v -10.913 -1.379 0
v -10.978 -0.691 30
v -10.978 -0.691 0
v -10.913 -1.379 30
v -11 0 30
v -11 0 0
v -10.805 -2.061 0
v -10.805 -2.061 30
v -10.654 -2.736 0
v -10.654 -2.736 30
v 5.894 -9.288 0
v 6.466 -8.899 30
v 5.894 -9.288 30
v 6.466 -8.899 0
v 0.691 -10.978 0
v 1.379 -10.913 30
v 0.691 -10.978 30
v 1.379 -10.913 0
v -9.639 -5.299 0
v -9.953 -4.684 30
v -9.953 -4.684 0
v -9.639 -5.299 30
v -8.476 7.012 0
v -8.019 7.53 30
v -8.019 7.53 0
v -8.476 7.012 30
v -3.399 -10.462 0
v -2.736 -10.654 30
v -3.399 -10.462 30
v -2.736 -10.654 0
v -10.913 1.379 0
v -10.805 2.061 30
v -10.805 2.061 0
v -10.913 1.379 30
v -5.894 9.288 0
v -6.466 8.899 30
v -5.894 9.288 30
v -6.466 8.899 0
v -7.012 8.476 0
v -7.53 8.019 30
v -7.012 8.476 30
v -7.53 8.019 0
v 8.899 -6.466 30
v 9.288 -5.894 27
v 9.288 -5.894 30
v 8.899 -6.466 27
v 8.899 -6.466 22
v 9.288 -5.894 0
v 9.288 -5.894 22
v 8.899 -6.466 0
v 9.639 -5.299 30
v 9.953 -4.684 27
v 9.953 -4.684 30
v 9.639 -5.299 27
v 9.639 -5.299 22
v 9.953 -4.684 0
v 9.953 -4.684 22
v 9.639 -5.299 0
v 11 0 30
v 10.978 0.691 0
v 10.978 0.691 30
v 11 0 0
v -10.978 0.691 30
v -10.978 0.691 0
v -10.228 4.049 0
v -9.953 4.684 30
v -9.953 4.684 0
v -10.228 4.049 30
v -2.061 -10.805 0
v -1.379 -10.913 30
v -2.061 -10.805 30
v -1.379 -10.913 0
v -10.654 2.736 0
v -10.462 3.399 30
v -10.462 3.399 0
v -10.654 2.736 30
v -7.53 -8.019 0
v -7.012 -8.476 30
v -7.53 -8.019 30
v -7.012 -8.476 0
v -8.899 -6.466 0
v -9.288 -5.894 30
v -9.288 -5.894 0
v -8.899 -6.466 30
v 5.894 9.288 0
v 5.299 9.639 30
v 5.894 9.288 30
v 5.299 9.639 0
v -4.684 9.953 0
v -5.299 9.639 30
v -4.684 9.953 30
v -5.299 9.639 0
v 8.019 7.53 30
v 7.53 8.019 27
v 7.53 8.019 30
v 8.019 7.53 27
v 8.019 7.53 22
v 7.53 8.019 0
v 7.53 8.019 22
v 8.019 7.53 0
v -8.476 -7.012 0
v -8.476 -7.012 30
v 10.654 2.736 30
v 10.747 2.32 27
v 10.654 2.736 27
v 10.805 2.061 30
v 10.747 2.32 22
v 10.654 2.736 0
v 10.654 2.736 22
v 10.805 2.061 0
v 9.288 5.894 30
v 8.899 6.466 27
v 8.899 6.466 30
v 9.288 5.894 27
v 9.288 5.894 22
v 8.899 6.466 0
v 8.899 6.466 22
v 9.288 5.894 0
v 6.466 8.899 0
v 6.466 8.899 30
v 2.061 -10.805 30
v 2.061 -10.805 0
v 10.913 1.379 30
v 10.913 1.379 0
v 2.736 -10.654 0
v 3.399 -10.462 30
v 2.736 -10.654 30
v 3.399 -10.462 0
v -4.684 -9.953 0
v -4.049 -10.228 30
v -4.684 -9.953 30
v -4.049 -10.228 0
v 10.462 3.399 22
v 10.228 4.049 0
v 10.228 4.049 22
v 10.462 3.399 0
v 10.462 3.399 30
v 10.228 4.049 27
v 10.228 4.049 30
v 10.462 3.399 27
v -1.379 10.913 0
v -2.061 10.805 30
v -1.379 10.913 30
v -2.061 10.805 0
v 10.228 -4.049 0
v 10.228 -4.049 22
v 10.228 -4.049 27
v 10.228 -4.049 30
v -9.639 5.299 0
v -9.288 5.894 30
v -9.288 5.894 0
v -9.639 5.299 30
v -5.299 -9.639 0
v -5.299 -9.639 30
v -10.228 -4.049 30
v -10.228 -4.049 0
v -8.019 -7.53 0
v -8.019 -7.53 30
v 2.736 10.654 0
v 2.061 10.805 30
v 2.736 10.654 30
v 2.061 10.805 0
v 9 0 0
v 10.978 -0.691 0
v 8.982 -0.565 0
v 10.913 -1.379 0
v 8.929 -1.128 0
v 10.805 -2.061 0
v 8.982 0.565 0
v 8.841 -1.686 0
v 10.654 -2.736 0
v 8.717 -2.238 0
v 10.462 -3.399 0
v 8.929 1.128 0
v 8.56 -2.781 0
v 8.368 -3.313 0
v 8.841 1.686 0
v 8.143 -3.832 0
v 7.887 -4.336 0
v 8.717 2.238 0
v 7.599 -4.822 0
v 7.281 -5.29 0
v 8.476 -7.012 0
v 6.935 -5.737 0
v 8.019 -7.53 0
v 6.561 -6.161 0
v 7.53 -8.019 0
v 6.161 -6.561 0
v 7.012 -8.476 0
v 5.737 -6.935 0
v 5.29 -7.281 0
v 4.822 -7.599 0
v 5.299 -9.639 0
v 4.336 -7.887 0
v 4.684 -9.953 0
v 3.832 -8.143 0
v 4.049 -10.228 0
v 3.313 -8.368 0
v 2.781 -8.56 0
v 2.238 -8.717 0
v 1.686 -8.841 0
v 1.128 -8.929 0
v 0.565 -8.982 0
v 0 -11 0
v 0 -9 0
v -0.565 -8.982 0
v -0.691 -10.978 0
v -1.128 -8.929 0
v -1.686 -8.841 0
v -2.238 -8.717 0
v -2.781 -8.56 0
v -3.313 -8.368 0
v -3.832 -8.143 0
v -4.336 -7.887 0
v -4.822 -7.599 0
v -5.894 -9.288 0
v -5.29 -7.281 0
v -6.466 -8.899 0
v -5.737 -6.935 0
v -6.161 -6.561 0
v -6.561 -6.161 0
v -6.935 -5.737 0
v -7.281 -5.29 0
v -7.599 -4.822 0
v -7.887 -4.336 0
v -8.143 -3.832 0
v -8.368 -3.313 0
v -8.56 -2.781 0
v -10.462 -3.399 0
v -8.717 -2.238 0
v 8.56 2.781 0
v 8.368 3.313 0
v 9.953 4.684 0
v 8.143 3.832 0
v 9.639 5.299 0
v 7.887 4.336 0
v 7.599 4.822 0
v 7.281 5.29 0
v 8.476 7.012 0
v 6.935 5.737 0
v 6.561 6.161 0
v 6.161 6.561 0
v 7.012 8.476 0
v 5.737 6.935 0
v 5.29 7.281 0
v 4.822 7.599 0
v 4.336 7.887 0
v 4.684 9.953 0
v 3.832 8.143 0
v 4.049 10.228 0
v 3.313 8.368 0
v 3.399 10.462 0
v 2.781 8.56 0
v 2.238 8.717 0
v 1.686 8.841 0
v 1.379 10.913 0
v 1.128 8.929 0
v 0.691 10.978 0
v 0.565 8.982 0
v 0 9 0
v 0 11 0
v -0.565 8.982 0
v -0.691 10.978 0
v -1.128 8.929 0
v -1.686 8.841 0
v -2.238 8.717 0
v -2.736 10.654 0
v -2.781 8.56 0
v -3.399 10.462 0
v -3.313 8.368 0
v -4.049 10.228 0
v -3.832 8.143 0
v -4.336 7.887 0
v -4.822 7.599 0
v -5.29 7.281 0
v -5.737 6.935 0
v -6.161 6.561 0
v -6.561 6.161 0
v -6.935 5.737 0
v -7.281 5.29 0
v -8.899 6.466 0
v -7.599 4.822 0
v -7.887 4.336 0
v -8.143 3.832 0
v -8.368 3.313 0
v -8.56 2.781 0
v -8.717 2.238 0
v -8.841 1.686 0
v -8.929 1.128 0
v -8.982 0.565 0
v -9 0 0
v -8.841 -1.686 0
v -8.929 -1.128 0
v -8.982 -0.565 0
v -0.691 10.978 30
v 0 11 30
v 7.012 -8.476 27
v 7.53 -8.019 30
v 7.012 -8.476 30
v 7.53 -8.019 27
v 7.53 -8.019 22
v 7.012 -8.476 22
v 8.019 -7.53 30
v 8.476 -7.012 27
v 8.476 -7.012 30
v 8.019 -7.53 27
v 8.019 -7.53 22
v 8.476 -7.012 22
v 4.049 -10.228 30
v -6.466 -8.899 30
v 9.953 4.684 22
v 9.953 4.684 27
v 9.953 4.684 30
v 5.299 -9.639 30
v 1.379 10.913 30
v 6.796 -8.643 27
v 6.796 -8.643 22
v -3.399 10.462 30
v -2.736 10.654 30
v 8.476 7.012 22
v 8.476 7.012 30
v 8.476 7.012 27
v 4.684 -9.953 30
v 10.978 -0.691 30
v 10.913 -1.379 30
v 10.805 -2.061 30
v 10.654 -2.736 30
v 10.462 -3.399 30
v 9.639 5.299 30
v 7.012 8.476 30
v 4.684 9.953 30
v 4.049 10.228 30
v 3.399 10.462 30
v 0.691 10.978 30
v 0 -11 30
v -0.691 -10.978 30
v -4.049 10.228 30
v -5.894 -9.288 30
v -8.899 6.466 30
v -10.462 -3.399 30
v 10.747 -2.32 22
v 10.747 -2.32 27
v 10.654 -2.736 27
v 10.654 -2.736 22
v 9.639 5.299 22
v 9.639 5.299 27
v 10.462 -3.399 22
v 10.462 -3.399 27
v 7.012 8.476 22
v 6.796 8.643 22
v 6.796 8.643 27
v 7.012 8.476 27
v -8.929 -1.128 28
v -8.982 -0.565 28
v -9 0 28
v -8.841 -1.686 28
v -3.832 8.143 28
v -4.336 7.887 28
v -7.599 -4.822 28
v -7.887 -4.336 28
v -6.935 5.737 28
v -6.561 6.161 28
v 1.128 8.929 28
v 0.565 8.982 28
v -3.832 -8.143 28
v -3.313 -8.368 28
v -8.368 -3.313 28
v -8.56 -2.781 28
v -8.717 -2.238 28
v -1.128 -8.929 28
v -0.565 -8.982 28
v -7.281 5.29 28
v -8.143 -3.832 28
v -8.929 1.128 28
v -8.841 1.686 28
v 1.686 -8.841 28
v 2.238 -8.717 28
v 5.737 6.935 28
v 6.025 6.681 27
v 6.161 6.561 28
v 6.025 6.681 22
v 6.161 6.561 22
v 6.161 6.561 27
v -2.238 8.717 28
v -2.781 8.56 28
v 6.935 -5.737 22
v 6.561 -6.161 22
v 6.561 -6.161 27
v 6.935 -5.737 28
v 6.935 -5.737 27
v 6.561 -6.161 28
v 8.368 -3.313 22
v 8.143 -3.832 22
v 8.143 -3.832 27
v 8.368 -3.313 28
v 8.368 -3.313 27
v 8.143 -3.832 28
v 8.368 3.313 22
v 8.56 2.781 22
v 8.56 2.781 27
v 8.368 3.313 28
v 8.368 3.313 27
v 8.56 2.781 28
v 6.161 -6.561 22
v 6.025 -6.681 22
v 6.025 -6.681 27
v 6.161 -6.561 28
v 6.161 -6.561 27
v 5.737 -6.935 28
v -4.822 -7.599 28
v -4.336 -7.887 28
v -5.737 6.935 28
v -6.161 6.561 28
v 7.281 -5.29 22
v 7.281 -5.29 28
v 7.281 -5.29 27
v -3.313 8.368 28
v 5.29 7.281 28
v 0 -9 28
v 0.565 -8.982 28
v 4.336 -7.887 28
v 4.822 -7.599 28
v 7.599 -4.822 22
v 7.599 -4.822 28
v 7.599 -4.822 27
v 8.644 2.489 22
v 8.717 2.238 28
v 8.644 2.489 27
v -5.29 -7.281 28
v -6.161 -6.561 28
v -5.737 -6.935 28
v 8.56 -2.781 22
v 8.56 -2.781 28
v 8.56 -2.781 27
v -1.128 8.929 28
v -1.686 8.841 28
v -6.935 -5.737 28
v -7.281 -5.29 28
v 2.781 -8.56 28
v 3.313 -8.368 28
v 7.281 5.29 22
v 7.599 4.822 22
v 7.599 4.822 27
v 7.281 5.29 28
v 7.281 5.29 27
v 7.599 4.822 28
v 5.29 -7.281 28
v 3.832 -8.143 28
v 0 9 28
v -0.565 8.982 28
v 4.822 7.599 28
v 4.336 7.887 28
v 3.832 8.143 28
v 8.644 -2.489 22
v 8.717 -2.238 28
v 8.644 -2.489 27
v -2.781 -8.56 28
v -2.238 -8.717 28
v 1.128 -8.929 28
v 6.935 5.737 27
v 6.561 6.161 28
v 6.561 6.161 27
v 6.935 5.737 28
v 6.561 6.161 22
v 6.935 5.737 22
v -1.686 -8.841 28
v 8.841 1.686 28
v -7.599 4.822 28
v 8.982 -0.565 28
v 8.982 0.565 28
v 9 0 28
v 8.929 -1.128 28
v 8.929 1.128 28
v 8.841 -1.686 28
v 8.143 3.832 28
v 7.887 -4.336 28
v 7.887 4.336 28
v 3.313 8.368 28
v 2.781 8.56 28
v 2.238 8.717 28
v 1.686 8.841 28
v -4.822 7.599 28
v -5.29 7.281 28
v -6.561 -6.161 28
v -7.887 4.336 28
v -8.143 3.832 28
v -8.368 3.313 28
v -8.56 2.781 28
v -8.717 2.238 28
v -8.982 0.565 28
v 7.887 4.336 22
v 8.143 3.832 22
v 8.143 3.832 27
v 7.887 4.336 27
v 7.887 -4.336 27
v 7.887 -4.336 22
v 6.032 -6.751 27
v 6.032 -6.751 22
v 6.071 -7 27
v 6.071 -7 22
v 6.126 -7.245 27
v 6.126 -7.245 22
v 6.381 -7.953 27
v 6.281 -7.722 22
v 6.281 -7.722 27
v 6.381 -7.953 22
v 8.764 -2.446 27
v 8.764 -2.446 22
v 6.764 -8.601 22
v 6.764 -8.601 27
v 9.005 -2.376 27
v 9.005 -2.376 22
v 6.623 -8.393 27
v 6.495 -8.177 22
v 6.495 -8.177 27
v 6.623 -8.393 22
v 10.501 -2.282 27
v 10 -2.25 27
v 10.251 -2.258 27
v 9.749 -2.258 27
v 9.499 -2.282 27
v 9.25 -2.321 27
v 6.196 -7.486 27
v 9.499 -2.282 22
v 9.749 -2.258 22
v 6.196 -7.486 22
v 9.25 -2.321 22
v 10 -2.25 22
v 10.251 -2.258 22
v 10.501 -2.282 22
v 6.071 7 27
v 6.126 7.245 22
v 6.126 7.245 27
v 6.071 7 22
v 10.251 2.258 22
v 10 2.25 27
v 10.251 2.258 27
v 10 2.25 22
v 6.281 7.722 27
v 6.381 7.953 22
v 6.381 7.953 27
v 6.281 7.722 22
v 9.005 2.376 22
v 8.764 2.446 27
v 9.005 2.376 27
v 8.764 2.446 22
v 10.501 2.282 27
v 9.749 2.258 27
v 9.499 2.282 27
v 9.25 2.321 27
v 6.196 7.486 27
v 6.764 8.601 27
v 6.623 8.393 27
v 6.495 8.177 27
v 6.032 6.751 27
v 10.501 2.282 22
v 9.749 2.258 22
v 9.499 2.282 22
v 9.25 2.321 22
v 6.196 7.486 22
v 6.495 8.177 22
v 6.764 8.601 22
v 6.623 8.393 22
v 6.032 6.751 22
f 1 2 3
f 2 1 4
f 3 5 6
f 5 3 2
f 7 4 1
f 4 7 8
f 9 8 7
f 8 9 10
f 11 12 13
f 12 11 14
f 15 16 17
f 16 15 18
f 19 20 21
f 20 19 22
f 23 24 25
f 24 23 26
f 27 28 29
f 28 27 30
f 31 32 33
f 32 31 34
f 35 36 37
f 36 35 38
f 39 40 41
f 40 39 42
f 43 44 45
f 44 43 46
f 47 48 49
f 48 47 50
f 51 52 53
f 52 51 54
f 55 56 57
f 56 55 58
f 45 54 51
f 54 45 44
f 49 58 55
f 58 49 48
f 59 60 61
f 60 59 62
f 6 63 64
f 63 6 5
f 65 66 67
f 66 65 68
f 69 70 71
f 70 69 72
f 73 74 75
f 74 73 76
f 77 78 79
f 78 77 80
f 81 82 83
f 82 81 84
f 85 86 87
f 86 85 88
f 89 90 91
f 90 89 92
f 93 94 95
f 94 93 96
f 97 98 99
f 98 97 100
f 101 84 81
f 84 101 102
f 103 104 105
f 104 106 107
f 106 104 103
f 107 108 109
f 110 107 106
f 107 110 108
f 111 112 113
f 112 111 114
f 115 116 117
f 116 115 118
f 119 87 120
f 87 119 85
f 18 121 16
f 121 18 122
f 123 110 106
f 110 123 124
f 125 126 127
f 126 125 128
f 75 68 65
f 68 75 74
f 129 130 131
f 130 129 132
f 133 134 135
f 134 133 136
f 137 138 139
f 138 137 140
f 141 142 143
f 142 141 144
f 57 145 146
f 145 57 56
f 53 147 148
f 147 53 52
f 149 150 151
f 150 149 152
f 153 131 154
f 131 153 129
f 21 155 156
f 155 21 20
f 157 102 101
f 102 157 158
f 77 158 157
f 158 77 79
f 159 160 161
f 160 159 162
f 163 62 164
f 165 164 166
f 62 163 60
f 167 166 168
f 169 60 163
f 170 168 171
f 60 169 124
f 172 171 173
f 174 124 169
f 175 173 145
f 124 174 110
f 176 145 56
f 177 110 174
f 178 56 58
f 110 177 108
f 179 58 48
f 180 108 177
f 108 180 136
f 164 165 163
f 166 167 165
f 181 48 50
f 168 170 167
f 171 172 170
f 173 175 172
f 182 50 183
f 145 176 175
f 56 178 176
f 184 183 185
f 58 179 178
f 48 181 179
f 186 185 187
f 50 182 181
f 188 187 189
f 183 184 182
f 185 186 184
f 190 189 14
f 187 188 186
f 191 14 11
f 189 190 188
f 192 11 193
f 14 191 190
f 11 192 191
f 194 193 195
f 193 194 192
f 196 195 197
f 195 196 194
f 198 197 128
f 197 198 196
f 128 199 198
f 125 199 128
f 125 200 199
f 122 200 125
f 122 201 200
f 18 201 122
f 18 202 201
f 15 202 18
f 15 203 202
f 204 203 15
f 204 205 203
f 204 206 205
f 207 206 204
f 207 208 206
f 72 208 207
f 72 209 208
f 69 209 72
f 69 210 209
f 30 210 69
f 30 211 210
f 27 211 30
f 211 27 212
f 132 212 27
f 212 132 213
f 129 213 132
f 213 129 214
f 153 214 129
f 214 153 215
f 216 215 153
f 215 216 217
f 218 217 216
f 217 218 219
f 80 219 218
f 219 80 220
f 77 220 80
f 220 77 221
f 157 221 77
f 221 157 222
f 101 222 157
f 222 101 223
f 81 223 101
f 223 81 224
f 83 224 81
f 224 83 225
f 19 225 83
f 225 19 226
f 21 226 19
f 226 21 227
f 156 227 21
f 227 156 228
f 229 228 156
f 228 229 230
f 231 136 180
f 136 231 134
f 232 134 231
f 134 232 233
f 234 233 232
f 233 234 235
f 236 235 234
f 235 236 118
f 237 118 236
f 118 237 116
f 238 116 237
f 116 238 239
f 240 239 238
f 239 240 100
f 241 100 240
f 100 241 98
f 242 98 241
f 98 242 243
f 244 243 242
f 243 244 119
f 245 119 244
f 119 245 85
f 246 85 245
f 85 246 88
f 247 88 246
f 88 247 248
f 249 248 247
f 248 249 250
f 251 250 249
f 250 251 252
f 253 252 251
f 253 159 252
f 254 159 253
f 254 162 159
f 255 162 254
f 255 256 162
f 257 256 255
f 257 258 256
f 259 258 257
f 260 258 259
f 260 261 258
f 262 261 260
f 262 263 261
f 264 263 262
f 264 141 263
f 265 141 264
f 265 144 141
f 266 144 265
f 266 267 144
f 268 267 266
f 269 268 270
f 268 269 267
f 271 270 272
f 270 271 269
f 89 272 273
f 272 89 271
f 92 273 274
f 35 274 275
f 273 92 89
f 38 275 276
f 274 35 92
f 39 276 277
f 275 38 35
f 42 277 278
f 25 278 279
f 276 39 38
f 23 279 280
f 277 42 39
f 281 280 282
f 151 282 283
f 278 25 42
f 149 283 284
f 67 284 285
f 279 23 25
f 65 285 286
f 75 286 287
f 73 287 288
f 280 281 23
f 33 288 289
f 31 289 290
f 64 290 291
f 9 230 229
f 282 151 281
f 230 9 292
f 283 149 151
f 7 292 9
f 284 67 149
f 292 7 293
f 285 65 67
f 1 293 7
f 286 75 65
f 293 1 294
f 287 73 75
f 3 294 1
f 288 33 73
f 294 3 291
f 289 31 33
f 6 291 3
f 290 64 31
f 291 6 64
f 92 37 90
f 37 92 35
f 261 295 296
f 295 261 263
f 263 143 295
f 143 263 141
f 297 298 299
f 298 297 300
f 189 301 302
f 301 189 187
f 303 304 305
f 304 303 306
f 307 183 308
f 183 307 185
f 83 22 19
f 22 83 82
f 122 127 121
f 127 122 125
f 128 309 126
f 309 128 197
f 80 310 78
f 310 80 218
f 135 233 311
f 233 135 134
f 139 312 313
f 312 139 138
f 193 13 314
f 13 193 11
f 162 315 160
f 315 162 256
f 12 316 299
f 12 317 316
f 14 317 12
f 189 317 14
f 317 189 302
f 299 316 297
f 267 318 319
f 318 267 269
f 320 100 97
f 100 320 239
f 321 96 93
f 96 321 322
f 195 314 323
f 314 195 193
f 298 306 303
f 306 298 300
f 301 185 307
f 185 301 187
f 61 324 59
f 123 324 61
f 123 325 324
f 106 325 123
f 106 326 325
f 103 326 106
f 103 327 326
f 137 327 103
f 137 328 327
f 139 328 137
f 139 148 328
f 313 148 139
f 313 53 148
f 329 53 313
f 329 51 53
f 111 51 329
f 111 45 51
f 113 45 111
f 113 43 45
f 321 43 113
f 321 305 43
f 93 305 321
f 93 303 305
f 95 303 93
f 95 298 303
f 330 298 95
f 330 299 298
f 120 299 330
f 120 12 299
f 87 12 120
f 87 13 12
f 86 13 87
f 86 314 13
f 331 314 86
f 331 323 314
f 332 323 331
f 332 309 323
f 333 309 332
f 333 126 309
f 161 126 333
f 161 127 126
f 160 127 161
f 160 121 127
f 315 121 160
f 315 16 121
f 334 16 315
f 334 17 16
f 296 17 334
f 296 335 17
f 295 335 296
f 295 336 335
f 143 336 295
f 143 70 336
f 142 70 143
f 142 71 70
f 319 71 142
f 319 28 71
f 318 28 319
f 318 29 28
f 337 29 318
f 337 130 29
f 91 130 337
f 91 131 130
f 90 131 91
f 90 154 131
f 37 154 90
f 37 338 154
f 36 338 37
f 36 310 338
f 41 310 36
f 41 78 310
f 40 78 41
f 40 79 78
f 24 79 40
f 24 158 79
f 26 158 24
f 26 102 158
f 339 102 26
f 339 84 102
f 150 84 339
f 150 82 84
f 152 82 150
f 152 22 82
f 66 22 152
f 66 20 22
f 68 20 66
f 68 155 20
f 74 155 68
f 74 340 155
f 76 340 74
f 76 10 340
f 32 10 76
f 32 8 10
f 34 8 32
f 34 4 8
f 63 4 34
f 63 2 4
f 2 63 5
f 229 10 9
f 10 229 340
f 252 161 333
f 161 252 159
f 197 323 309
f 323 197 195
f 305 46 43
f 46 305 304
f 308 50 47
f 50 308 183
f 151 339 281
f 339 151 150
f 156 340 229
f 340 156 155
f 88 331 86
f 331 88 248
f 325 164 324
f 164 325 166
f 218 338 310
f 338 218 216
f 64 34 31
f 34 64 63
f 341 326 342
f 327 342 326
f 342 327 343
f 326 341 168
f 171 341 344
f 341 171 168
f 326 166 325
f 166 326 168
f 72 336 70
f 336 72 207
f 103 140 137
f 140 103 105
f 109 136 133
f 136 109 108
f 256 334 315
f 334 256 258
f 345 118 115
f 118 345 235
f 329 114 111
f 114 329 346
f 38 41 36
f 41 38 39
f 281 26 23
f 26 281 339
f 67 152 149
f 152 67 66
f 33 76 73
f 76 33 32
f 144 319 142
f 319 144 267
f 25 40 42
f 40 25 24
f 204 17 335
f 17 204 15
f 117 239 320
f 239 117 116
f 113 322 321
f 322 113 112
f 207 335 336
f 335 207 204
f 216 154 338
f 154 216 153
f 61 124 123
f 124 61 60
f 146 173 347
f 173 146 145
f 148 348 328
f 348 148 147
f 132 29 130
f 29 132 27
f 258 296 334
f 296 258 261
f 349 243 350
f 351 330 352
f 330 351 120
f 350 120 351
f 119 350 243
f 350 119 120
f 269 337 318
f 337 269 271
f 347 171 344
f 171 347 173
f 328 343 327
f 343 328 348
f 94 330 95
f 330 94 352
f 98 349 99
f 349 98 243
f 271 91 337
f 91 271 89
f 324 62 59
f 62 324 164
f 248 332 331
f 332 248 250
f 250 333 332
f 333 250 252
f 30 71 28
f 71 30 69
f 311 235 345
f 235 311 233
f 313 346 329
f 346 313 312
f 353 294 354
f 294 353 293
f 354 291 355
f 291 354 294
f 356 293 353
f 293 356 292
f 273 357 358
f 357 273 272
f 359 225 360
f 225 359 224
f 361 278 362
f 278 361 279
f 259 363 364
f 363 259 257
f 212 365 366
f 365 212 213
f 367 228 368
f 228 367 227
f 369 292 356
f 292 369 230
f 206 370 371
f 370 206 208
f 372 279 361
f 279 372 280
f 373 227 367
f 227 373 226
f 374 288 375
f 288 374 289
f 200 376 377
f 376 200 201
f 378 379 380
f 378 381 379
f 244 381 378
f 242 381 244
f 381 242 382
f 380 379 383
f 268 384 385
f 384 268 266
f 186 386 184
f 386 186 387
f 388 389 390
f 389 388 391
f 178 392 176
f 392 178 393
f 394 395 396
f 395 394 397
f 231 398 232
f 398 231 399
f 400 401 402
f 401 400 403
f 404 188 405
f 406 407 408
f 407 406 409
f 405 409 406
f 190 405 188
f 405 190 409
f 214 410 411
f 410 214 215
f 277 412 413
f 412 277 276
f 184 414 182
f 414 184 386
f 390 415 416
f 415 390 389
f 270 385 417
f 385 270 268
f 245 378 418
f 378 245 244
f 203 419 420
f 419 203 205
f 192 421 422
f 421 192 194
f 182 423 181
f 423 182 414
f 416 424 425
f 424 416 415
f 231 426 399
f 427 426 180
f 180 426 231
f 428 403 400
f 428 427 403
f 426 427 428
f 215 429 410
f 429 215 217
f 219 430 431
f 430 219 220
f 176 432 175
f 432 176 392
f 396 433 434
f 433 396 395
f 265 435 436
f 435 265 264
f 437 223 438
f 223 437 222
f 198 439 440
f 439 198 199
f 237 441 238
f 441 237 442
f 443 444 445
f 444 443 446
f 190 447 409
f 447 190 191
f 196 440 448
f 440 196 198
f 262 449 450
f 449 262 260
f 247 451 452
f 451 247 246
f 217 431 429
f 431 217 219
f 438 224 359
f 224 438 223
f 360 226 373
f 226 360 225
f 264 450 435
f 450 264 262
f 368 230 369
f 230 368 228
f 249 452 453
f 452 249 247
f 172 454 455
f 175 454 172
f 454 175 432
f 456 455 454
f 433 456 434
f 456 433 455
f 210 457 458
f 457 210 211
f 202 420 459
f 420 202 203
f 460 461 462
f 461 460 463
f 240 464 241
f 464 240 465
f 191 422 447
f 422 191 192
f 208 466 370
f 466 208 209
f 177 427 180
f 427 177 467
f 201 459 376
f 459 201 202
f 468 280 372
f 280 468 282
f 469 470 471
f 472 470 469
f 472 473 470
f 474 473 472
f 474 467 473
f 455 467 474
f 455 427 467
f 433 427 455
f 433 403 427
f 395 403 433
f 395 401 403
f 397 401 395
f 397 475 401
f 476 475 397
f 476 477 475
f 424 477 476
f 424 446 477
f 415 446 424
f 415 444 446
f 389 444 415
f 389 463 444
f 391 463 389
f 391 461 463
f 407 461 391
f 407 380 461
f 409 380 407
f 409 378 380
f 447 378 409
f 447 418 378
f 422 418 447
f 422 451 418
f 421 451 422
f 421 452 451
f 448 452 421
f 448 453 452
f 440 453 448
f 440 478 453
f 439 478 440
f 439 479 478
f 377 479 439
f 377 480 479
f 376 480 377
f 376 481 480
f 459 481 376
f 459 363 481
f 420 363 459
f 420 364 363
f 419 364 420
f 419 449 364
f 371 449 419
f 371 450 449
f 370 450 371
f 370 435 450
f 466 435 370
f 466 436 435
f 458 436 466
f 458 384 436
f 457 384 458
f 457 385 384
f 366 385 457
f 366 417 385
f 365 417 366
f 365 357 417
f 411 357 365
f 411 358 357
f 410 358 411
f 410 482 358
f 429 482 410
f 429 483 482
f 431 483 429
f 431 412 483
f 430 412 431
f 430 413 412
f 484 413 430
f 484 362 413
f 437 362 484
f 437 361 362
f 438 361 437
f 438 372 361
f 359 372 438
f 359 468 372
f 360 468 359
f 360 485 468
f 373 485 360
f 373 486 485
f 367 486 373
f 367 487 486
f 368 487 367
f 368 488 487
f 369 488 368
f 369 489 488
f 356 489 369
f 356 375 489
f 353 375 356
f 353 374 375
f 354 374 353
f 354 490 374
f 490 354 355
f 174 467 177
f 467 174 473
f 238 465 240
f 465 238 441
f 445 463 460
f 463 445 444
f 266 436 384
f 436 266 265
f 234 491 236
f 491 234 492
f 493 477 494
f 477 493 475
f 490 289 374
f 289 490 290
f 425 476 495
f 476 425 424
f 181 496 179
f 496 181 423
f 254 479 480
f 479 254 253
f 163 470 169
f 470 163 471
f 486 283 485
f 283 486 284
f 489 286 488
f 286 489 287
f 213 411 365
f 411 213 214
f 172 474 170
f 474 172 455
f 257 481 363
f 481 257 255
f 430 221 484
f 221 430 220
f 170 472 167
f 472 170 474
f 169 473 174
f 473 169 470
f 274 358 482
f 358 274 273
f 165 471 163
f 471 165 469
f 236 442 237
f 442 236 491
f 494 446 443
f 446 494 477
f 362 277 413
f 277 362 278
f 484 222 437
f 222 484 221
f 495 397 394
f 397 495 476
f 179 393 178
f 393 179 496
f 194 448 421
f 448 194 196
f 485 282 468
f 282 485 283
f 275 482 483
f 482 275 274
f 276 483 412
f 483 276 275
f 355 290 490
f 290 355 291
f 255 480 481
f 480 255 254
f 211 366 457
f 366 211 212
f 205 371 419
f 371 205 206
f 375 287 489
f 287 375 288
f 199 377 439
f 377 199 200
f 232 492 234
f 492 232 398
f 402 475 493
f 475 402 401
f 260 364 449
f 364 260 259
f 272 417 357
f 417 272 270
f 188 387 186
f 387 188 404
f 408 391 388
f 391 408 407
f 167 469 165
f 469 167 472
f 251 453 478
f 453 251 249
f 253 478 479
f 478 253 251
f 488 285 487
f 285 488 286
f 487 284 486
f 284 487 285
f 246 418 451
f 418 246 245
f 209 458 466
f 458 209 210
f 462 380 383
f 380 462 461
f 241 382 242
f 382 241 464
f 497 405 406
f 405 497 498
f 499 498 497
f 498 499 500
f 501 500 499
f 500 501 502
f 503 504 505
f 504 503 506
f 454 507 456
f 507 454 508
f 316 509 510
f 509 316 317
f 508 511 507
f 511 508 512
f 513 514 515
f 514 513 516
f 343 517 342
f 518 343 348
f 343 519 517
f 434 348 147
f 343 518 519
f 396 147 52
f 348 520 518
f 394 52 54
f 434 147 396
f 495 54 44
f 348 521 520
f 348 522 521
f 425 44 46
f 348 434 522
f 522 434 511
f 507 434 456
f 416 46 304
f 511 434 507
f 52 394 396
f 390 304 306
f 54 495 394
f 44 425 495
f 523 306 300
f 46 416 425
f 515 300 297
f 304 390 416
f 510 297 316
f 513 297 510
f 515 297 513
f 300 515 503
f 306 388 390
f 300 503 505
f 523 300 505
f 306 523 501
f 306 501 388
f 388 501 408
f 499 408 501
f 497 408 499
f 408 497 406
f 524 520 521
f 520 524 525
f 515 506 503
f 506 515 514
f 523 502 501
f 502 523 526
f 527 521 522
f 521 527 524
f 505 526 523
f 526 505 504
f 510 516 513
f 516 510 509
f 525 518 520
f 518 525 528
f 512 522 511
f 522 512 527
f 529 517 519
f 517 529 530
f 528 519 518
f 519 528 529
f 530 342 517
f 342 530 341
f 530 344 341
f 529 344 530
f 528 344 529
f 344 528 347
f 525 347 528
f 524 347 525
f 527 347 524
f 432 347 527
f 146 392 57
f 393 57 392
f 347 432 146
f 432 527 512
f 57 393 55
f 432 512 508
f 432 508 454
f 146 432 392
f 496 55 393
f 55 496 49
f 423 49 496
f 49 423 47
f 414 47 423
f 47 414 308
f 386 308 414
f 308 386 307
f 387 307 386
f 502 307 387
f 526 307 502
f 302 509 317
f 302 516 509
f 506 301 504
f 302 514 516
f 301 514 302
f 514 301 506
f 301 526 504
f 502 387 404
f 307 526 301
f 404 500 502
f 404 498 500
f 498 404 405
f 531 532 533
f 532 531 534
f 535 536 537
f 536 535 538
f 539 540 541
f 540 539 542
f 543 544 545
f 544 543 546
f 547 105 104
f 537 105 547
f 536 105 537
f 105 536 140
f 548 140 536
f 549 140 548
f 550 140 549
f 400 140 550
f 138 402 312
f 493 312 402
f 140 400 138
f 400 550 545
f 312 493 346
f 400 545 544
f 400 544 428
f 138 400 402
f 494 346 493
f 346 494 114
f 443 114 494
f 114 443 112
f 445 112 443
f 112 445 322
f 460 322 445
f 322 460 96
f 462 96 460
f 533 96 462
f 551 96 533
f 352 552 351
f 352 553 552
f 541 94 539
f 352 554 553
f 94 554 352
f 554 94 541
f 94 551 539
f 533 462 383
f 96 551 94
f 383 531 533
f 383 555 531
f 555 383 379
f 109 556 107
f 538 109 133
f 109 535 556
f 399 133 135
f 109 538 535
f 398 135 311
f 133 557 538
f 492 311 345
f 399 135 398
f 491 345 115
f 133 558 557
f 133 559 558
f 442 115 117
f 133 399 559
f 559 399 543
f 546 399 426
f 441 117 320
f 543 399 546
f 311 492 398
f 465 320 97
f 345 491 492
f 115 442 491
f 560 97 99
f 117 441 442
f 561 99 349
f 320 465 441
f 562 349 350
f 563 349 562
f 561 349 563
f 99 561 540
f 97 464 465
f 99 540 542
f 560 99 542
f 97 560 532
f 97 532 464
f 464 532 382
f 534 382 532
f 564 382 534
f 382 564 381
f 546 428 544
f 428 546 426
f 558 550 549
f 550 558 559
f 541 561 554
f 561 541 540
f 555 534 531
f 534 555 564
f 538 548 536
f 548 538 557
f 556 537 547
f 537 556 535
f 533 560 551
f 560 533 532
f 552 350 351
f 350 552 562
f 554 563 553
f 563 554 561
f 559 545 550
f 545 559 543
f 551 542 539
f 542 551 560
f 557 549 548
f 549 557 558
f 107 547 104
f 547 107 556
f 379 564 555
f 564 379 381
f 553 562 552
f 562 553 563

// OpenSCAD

// This is a parametric case maker for a motor

// to make a custom case, replace the parameters with your own

diameter_of_motor = 18;
thickness_of_case = 2;
// Distance from the front of the motor(not including the spinning end) to the other end (not including the power ends)
height_of_motor = 28; 
// The height from the ground to the first power end when the motor is sideways
height_to_ends = 19; 
diameter_of_ends = 4; 
// Distance on a different axis than "Height To Ends"
distance_between_ends = 12.5;
// The length of the ends protruding out of the motor 
length_of_ends = 5;
// Where along the motor do the ends come out? If it is at the way end, put in 0
distance_to_ends = 7;
// Number of edges on cylinder (use smaller numbers for rendering quickly and higher ones for final output)
resolution = 100;


//program
if (length_of_ends - distance_to_ends >0)
{
rotate ([0,0,180])
difference() {
cylinder(r = (diameter_of_motor/2+thickness_of_case),$fn = resolution, h = (height_of_motor+thickness_of_case));
cylinder(r = (diameter_of_motor/2), h = height_of_motor,$fn = resolution);
translate([diameter_of_motor/2-height_to_ends,distance_between_ends/2,height_of_motor-distance_to_ends/2])
cylinder(r = (diameter_of_ends/2)+thickness_of_case, h = length_of_ends+2 * thickness_of_case, center = true,$fn = resolution);
translate([diameter_of_motor/2-height_to_ends,-distance_between_ends/2,height_of_motor-distance_to_ends/2])
cylinder(r = (diameter_of_ends/2)+thickness_of_case, h = length_of_ends+2 * thickness_of_case, center = true,$fn = resolution);
}
}
else
{
rotate ([0,0,180])
difference() {
cylinder(r = (diameter_of_motor/2+thickness_of_case), h = (height_of_motor+thickness_of_case),$fn = resolution);
cylinder(r = (diameter_of_motor/2), h = height_of_motor,$fn = resolution);
translate([diameter_of_motor/2-height_to_ends,distance_between_ends/2,height_of_motor-distance_to_ends/2])
cylinder(r = (diameter_of_ends/2)+thickness_of_case, h = length_of_ends, center = true,$fn = resolution);
translate([diameter_of_motor/2-height_to_ends,-distance_between_ends/2,height_of_motor-distance_to_ends/2])
cylinder(r = (diameter_of_ends/2)+thickness_of_case, h = length_of_ends, center = true,$fn = resolution);
}
}
